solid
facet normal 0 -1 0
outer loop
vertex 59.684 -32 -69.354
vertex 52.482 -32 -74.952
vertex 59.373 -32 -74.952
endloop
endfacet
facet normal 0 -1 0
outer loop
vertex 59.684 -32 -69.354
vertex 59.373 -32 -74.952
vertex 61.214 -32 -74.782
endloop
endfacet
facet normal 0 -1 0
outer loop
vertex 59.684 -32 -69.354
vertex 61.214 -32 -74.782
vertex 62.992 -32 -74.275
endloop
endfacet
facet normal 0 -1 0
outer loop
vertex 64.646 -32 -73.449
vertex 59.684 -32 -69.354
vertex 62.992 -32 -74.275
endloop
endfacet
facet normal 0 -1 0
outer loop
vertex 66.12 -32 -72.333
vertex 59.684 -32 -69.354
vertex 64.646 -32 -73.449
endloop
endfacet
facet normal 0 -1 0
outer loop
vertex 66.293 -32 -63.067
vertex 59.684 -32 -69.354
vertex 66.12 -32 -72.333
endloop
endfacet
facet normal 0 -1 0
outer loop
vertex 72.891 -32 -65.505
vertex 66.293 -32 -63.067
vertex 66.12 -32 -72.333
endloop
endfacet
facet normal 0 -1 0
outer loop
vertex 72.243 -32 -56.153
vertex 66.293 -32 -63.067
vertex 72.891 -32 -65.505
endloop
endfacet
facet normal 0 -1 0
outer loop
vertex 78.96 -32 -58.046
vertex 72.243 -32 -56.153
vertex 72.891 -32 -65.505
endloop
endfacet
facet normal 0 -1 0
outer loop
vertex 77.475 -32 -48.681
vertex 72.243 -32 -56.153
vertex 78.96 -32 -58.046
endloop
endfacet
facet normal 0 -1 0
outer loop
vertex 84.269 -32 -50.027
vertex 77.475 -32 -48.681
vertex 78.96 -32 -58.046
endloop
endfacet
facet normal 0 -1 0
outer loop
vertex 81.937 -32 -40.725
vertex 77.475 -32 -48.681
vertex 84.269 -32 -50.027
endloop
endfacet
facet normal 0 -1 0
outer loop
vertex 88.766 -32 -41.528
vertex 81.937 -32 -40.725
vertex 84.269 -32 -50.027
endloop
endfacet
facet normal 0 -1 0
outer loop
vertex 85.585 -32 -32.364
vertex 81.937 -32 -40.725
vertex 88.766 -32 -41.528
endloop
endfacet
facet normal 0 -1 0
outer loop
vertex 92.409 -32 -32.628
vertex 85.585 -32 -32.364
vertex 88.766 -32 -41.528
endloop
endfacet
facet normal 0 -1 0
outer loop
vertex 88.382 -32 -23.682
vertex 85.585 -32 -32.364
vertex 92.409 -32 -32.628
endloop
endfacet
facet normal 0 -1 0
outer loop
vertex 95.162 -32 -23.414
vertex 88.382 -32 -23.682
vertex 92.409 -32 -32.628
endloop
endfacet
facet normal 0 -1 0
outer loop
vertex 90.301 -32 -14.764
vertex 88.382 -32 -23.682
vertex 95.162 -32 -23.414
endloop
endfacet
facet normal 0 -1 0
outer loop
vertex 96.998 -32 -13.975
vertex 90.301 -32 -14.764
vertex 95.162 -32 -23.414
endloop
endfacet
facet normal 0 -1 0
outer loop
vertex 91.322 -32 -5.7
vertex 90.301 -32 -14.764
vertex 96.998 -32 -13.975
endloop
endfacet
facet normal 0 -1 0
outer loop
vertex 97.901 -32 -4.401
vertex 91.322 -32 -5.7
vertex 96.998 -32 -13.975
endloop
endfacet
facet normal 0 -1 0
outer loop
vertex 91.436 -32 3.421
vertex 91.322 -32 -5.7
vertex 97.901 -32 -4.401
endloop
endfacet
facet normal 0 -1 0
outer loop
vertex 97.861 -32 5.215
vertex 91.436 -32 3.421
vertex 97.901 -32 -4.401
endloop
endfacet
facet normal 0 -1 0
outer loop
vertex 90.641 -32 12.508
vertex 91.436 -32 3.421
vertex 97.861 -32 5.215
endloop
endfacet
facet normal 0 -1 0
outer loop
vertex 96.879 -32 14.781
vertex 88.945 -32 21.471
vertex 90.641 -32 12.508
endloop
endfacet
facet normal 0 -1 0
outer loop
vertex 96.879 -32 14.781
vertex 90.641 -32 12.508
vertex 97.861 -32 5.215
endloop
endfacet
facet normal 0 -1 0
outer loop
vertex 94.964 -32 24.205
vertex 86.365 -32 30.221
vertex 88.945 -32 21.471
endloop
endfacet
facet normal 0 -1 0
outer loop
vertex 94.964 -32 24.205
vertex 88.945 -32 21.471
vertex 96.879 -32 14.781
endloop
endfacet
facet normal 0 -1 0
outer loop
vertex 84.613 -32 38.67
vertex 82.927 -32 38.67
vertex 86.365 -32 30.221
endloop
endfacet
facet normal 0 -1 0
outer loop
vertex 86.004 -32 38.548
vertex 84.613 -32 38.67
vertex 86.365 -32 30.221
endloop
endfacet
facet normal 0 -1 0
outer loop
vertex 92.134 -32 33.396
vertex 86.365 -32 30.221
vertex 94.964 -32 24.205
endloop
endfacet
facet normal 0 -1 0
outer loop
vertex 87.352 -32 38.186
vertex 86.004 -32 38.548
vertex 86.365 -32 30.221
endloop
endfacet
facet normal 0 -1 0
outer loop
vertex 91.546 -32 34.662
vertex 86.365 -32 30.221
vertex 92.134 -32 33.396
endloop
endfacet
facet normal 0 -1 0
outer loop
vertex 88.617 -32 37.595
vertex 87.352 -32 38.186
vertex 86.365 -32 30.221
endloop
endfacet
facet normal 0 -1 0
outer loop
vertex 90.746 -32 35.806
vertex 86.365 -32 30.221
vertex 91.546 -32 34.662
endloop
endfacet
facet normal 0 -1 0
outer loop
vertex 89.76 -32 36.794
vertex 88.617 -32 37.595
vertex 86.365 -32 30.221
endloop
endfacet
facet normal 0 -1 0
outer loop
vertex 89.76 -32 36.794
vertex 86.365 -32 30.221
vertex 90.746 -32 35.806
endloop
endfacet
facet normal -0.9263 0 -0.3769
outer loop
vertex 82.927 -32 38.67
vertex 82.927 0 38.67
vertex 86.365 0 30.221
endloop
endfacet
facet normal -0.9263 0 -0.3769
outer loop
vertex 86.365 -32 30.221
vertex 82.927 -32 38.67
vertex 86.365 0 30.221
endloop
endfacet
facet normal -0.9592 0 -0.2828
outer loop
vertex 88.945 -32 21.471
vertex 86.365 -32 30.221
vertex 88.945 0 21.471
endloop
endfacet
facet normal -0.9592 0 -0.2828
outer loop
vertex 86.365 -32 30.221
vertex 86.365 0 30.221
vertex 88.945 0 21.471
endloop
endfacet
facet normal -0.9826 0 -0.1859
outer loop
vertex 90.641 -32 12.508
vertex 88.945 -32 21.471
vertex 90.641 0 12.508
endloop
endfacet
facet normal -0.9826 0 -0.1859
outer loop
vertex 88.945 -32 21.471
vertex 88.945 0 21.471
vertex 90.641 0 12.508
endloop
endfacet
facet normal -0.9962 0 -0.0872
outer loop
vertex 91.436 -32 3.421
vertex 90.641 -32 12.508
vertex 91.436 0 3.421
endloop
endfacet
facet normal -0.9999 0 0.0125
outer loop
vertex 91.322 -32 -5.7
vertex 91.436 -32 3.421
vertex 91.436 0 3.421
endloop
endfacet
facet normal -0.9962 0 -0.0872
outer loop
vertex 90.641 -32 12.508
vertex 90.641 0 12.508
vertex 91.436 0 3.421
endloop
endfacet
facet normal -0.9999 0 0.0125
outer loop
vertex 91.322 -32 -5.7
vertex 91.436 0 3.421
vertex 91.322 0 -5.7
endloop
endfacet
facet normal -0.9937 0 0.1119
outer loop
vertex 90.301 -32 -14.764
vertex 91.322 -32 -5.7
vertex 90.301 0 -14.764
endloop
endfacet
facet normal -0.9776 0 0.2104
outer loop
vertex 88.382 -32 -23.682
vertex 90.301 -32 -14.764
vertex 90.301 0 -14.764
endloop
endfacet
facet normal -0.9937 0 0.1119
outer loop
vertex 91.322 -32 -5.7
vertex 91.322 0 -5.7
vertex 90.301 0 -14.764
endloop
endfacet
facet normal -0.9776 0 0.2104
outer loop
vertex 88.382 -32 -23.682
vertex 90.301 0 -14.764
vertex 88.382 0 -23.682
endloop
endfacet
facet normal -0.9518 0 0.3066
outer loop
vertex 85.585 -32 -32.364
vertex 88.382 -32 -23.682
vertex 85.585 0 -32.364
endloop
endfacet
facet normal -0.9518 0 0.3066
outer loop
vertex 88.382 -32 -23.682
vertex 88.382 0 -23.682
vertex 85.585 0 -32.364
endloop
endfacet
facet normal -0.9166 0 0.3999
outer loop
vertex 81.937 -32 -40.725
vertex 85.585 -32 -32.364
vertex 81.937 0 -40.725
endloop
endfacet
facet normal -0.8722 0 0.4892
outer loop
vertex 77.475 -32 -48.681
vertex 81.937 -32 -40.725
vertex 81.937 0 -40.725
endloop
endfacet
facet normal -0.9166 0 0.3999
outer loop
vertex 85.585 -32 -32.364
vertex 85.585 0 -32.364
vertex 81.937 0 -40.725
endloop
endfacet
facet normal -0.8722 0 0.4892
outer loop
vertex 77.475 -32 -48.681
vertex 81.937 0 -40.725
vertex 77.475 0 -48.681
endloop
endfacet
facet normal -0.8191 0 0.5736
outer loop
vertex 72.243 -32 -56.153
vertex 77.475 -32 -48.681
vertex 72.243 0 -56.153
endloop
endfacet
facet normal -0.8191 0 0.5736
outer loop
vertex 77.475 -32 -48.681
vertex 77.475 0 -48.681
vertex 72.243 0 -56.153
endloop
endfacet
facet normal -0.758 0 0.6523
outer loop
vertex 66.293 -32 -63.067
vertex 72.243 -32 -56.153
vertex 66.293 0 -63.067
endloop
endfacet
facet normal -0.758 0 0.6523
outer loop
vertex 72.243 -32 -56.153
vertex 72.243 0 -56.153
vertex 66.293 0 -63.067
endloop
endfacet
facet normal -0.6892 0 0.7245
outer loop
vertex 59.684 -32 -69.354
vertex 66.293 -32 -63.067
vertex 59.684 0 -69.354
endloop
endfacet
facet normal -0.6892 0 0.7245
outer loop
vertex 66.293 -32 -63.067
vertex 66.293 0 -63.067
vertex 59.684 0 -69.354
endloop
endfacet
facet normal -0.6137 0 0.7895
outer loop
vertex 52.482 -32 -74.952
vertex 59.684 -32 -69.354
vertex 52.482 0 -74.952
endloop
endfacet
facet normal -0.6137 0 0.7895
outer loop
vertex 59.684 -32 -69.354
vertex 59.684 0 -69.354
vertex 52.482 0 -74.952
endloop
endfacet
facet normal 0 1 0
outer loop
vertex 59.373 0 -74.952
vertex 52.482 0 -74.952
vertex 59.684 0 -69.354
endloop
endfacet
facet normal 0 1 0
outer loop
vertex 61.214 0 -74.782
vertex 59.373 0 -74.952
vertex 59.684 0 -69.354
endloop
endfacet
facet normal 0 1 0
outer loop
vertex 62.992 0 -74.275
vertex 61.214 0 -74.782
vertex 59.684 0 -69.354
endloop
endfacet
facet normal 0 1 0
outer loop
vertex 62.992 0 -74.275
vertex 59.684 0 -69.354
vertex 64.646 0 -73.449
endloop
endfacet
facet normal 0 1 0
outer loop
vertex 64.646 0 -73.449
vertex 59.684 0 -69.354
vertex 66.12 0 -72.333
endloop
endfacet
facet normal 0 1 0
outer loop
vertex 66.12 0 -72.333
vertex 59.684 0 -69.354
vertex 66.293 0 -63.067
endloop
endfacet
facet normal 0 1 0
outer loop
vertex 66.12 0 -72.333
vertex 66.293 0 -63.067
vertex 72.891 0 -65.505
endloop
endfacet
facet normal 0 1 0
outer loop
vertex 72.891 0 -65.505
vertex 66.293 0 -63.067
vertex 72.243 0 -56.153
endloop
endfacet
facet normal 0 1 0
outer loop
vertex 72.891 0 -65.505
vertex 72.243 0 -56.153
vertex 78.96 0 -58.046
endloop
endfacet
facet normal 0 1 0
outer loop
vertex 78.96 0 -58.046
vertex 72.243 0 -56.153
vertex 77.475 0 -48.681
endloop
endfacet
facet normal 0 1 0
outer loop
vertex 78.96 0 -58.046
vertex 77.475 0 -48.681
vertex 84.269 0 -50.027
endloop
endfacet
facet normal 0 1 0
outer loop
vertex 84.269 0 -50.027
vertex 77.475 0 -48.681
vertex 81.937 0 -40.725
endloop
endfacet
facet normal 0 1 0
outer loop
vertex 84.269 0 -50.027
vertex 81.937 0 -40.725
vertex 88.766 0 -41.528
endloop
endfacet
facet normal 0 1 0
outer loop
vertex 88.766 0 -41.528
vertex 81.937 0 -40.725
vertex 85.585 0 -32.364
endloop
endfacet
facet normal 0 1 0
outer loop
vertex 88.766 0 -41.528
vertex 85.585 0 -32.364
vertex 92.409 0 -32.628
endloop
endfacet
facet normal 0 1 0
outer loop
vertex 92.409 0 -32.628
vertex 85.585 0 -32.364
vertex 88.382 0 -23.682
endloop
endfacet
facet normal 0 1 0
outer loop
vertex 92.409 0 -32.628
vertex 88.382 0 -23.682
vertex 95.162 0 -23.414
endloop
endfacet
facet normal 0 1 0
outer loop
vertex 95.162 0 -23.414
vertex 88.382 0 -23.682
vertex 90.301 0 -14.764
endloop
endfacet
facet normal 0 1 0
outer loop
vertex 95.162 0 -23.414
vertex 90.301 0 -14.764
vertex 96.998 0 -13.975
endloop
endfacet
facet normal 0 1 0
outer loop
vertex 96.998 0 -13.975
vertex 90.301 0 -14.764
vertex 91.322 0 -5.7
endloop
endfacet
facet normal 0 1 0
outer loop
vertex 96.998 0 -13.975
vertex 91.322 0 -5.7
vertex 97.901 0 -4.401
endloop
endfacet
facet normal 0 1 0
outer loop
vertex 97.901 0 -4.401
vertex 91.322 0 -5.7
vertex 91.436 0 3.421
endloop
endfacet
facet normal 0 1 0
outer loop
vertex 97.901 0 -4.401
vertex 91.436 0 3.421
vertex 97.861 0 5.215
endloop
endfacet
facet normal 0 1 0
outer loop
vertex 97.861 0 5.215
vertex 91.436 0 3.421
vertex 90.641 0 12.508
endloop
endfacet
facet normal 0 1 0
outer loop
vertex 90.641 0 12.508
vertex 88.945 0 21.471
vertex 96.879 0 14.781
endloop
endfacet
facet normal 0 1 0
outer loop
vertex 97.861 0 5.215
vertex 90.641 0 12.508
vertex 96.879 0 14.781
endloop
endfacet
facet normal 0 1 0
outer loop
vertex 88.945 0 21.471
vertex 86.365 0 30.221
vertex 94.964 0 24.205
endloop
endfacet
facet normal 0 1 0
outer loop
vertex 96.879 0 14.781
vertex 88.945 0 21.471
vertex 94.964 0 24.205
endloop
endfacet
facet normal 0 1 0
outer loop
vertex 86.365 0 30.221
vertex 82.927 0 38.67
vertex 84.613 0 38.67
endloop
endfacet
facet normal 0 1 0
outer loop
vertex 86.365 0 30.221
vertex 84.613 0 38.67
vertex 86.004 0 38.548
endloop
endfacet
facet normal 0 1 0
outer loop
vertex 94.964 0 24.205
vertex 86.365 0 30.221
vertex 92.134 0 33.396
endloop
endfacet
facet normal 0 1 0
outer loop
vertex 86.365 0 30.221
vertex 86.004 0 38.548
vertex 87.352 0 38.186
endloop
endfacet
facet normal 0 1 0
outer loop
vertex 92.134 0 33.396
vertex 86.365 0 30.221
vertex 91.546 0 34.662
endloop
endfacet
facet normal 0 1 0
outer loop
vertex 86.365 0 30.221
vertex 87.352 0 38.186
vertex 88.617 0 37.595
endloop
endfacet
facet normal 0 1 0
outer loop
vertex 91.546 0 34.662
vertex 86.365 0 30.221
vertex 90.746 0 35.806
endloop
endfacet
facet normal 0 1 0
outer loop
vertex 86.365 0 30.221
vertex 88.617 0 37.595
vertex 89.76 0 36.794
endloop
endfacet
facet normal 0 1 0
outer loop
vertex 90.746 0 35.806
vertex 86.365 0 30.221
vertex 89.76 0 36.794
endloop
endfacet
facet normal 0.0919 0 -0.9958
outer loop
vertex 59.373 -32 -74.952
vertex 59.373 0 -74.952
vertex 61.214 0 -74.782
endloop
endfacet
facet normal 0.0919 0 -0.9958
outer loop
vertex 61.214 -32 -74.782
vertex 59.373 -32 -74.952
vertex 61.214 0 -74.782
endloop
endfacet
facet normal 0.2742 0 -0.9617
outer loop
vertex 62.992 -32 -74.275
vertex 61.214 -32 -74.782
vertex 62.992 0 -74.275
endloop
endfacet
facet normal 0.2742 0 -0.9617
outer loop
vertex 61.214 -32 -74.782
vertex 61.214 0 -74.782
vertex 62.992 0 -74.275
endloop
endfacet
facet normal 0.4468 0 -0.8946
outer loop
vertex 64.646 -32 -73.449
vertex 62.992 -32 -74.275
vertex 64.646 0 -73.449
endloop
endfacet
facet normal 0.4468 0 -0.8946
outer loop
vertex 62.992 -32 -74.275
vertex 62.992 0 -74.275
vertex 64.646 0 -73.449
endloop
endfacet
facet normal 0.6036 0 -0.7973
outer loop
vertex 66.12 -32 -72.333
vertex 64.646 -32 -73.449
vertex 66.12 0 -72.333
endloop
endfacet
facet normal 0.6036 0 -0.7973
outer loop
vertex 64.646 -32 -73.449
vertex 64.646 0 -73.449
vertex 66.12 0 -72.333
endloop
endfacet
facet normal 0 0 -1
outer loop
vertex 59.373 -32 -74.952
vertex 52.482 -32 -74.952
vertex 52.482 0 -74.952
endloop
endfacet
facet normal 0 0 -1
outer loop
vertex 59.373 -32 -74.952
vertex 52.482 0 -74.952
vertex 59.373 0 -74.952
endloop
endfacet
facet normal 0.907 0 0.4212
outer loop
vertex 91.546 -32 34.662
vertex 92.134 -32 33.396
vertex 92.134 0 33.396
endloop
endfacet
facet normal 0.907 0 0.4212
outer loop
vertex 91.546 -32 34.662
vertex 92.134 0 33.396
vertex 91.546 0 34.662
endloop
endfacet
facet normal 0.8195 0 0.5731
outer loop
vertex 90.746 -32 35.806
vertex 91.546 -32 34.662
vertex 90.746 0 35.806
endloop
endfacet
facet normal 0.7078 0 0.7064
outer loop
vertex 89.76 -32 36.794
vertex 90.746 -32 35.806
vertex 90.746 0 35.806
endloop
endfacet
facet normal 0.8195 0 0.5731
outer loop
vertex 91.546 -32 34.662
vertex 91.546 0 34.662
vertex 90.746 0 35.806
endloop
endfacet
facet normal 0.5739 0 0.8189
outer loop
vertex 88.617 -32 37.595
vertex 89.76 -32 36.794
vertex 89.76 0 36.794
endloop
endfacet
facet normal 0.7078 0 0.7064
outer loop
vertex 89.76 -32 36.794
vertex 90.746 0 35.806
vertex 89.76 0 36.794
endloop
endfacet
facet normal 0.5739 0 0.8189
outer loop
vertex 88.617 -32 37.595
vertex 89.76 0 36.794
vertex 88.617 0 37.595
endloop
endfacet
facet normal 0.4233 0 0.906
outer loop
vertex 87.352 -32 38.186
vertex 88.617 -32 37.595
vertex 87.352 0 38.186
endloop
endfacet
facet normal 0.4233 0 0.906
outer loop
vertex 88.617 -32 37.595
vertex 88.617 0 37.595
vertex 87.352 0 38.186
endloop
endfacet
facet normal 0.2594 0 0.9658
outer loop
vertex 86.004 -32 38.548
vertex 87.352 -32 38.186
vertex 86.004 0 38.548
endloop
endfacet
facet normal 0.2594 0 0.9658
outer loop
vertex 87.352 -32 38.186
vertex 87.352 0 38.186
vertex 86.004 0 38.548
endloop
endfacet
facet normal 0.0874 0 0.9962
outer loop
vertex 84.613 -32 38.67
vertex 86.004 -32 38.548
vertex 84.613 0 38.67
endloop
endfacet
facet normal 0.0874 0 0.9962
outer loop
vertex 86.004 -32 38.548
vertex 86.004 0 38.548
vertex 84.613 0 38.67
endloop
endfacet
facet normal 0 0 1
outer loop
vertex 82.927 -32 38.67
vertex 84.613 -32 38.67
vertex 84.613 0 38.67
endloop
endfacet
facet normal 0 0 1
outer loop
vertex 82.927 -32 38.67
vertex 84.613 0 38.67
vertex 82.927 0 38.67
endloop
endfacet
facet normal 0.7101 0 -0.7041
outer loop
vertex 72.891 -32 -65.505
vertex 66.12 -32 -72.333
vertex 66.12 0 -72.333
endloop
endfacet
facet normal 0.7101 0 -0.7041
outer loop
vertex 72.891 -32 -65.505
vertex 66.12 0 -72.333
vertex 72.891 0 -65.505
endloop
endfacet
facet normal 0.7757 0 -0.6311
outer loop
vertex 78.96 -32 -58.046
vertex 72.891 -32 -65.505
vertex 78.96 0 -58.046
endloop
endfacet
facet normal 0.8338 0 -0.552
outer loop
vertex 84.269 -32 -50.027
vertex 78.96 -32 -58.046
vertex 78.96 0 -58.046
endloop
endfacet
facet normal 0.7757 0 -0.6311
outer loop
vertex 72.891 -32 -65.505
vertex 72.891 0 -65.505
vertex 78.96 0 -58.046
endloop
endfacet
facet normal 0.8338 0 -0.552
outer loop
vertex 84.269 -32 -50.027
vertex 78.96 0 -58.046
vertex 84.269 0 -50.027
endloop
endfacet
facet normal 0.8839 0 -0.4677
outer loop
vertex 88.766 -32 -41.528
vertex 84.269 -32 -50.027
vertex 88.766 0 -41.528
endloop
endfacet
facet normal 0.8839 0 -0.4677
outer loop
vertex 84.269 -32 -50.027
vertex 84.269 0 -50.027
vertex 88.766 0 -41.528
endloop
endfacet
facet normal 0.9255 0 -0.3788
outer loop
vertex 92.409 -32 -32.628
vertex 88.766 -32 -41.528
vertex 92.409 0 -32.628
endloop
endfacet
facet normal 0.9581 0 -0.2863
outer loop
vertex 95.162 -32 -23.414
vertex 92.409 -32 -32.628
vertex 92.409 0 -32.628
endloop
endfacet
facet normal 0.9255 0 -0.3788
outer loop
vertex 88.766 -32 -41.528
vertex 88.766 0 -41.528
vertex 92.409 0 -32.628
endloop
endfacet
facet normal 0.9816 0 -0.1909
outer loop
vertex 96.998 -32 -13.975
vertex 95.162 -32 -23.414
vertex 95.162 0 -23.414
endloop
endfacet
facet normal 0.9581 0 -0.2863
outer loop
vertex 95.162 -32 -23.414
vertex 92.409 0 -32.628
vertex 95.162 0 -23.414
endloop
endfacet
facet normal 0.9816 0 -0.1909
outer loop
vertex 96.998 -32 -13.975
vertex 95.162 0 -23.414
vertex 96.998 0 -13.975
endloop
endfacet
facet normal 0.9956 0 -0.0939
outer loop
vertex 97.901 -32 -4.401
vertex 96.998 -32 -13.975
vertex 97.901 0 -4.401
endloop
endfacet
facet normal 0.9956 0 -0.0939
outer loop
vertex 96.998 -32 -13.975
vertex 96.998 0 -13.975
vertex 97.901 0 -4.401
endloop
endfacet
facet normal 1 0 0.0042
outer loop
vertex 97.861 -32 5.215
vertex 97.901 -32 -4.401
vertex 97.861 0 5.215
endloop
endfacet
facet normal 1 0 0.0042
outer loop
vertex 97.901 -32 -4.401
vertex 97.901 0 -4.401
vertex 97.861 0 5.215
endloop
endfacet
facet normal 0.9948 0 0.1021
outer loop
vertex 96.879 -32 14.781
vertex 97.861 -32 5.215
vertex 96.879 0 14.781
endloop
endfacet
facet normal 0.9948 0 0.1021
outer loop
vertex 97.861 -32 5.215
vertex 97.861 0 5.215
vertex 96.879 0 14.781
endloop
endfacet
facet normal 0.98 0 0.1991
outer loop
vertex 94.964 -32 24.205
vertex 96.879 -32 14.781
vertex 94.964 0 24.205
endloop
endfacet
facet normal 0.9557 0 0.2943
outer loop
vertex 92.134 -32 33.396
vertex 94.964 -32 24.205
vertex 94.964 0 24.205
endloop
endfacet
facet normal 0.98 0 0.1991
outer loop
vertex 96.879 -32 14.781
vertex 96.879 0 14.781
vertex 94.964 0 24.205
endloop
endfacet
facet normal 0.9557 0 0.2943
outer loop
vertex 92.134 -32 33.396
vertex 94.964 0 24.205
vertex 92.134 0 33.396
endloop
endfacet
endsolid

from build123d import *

# Parameters (mm, degrees)
F1_DEPTH = 32


with BuildPart() as f1:
    # F0 (on Front) → F1 (new body)
    with BuildSketch(Plane.XZ):
        with BuildLine():
            ThreePointArc((82.927163, 38.669571), (88.382213, -23.681943), (52.482244, -74.952412))
            Line((52.482244, -74.952412), (59.373261, -74.952412))
            ThreePointArc((59.373261, -74.952412), (62.991993, -74.274685), (66.120223, -72.333368))
            ThreePointArc((66.120223, -72.333368), (95.161877, -23.414036), (92.134269, 33.395755))
            ThreePointArc((92.134269, 33.395755), (89.206062, 37.219742), (84.613104, 38.669571))
            Line((84.613104, 38.669571), (82.927163, 38.669571))
        make_face()
    extrude(amount=F1_DEPTH)


solid = f1.part
